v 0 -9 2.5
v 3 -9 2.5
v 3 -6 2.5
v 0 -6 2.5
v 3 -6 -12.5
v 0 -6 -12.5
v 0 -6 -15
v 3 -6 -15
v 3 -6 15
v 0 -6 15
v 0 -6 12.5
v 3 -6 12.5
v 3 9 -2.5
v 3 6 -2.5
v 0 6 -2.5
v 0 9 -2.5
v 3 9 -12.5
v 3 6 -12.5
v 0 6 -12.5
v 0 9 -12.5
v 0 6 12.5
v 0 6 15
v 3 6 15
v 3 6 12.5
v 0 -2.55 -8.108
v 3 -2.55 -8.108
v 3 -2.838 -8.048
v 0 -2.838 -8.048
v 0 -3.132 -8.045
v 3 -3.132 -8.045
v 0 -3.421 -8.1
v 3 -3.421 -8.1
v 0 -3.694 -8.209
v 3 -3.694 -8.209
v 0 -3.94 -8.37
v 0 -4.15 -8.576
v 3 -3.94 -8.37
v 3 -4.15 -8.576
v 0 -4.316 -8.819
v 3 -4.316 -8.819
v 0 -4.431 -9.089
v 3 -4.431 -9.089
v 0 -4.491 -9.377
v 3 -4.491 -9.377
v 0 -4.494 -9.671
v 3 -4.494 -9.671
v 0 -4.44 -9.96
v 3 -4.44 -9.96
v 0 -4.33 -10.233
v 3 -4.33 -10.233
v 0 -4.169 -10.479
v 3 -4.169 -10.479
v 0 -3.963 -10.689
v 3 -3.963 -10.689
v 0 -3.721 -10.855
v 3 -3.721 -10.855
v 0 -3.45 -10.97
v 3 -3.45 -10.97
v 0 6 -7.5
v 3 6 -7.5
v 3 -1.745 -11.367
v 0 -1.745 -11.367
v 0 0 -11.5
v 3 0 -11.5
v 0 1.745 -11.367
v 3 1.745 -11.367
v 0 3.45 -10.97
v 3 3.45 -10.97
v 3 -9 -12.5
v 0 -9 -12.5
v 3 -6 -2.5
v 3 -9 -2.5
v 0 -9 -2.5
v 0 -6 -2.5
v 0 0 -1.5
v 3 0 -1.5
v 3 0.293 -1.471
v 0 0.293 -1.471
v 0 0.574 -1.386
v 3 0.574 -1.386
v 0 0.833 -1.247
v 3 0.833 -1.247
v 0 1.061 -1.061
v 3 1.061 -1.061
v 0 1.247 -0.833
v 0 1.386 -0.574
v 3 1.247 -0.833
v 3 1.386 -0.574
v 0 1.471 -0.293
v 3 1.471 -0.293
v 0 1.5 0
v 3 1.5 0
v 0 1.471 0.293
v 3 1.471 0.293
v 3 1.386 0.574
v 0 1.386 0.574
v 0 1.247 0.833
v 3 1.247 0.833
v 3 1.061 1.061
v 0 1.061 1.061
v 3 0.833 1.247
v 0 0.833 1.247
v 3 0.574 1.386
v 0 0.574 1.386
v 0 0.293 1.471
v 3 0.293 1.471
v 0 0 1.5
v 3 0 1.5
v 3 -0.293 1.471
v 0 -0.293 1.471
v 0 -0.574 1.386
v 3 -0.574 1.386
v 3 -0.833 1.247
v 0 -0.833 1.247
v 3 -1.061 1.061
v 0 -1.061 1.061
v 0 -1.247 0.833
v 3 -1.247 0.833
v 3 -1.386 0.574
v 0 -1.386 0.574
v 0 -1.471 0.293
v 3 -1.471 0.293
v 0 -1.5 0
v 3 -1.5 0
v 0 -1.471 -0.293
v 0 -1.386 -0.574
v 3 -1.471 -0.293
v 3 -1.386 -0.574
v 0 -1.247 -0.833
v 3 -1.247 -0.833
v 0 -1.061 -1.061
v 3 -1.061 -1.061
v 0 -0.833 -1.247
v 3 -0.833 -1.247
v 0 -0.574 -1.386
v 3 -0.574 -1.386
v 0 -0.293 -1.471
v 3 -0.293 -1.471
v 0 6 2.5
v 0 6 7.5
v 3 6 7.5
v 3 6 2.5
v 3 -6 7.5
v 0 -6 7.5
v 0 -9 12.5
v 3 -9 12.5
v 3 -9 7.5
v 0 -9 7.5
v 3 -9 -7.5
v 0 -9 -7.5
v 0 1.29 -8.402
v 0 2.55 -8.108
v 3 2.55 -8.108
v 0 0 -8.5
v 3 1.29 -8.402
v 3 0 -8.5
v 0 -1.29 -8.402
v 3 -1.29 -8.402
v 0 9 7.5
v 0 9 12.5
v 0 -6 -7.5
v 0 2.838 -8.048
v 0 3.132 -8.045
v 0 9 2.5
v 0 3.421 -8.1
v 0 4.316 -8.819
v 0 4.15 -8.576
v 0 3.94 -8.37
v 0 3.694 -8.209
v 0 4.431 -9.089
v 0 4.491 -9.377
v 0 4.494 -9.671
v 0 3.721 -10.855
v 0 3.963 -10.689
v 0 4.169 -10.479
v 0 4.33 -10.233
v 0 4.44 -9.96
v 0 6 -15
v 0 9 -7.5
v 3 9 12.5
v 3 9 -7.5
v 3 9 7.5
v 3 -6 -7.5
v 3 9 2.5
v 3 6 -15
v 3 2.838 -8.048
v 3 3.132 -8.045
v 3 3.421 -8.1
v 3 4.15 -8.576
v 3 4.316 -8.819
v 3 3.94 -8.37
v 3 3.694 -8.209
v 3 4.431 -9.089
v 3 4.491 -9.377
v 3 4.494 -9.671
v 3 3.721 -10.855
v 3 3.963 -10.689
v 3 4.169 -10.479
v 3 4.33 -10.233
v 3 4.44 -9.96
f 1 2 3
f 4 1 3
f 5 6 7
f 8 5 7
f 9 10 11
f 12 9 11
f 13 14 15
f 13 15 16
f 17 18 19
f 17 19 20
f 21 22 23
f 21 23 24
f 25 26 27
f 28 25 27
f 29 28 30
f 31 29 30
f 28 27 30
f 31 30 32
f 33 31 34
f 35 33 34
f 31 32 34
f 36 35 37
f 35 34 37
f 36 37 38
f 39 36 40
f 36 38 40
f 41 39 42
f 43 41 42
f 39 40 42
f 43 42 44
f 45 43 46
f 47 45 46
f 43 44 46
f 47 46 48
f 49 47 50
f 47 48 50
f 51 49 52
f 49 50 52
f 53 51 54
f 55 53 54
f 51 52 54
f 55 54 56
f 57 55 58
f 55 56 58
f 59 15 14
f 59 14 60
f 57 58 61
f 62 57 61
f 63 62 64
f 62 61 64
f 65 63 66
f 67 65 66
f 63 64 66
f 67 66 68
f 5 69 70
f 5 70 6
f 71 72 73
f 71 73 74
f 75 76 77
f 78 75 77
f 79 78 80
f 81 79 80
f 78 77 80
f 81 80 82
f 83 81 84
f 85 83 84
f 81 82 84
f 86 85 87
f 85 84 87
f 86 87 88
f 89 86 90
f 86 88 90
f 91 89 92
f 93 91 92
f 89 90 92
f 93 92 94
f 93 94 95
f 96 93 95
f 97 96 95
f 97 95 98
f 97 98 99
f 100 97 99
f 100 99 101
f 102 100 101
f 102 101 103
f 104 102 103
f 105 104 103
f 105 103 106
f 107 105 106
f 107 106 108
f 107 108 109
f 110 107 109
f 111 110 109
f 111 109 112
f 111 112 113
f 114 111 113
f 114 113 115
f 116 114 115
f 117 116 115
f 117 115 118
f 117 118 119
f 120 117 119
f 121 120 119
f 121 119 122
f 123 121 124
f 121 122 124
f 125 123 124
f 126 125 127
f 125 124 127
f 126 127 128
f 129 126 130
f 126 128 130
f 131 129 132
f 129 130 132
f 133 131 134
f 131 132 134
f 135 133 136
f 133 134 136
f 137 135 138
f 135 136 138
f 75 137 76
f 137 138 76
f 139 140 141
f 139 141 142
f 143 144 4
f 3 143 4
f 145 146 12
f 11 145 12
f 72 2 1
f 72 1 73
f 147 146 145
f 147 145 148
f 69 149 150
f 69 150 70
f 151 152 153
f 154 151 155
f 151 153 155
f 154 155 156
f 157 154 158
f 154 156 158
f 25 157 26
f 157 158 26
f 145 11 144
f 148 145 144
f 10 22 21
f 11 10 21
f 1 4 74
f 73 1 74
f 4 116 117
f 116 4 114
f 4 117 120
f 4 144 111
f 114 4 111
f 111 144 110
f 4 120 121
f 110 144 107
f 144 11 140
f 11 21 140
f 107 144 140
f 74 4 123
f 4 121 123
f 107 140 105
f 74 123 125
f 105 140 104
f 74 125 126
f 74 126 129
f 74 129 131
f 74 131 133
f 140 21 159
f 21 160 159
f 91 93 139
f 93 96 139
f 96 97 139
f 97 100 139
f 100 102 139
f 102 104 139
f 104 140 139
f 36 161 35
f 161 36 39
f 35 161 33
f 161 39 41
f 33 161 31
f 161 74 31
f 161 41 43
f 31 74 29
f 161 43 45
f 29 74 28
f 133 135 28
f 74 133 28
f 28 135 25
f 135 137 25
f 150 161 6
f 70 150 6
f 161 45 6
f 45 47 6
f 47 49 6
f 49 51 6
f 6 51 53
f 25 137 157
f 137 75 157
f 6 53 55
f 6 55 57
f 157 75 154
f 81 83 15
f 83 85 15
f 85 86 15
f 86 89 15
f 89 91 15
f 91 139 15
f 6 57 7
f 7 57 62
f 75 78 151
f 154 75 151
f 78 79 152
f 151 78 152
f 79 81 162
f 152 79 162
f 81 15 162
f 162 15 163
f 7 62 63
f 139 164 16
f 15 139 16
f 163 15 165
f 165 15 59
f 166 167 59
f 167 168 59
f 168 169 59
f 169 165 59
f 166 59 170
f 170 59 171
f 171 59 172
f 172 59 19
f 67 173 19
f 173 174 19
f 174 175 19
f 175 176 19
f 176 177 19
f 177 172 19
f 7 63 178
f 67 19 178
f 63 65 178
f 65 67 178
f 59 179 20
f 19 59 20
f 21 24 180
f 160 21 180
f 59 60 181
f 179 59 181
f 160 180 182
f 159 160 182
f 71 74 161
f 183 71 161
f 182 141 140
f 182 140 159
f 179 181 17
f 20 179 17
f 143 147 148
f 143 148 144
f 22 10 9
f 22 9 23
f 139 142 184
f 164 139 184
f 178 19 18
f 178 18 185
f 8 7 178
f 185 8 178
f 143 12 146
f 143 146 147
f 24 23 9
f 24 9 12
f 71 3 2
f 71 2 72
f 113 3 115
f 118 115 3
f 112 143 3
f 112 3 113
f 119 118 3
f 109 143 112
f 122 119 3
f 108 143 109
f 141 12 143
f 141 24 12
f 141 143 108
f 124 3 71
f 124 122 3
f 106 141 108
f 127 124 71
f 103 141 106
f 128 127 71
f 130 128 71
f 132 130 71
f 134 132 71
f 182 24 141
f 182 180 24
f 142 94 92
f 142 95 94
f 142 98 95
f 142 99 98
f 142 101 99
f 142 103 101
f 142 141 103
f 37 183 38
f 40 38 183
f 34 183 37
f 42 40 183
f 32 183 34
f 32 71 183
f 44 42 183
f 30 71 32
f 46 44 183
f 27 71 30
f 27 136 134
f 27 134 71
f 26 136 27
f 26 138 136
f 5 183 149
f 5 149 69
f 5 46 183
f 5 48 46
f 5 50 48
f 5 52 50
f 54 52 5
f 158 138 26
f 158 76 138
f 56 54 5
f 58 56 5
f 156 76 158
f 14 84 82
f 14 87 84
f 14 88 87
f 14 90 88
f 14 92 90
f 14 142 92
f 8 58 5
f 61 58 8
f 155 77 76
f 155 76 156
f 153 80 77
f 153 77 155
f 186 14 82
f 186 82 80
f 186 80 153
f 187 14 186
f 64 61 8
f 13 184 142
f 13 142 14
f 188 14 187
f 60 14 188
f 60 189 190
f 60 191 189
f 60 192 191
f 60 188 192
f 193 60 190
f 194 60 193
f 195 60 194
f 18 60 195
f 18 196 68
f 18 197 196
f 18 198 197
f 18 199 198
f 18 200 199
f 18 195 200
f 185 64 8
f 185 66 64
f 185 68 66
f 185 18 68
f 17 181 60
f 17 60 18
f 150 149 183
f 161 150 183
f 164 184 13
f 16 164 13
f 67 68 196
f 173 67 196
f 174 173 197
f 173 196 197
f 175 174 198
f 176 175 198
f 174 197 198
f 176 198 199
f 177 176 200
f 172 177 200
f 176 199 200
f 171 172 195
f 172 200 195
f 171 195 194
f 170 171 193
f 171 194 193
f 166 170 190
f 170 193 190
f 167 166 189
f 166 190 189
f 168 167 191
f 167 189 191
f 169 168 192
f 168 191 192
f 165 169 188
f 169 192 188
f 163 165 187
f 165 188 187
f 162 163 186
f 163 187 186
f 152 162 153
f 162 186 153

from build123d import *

# Parameters (mm, degrees)
SKETCH1_W           = 30
SKETCH1_H           = 12
BOSS_EXTRUDE1_DEPTH = 3
SKETCH3_W           = 5
SKETCH3_H           = 3
BOSS_EXTRUDE2_DEPTH = 3
SKETCH4_R           = 1.5
CUT_EXTRUDE1_DEPTH  = 10


with BuildPart() as part:
    # Sketch1 → Boss-Extrude1 (new body)
    with BuildSketch(Plane(origin=(0, 0, 0), x_dir=(0, 0, -1), z_dir=(1, 0, 0))):
        Rectangle(SKETCH1_W, SKETCH1_H)
    extrude(amount=BOSS_EXTRUDE1_DEPTH)

    # Sketch3 → Boss-Extrude2 (add)
    with BuildSketch(Plane(origin=(3, 0, 0), x_dir=(0, 0, -1), z_dir=(1, 0, 0))):
        with Locations((-10, 7.5)):
            Rectangle(SKETCH3_W, SKETCH3_H)
        with Locations((0, 7.5)):
            Rectangle(SKETCH3_W, SKETCH3_H)
        with Locations((10, 7.5)):
            Rectangle(SKETCH3_W, SKETCH3_H)
        with Locations((10, -7.5)):
            Rectangle(SKETCH3_W, SKETCH3_H)
        with Locations((0, -7.5)):
            Rectangle(SKETCH3_W, SKETCH3_H)
        with Locations((-10, -7.5)):
            Rectangle(SKETCH3_W, SKETCH3_H)
    extrude(amount=-BOSS_EXTRUDE2_DEPTH)

    # Sketch4 → Cut-Extrude1 (cut)
    with BuildSketch(Plane(origin=(3, 0, 0), x_dir=(0, 0, -1), z_dir=(1, 0, 0))):
        Circle(SKETCH4_R)
        with BuildLine():
            ThreePointArc((10.970300816, -3.45), (11.5, 0), (10.970300816, 3.45))
            ThreePointArc((10.970300816, 3.45), (9.089392014, 4.430908802), (8.108483212, 2.55))
            ThreePointArc((8.108483212, 2.55), (8.5, 0), (8.108483212, -2.55))
            ThreePointArc((8.108483212, -2.55), (9.089392014, -4.430908802), (10.970300816, -3.45))
        make_face()
    extrude(amount=-CUT_EXTRUDE1_DEPTH, mode=Mode.SUBTRACT)


solid = part.part
